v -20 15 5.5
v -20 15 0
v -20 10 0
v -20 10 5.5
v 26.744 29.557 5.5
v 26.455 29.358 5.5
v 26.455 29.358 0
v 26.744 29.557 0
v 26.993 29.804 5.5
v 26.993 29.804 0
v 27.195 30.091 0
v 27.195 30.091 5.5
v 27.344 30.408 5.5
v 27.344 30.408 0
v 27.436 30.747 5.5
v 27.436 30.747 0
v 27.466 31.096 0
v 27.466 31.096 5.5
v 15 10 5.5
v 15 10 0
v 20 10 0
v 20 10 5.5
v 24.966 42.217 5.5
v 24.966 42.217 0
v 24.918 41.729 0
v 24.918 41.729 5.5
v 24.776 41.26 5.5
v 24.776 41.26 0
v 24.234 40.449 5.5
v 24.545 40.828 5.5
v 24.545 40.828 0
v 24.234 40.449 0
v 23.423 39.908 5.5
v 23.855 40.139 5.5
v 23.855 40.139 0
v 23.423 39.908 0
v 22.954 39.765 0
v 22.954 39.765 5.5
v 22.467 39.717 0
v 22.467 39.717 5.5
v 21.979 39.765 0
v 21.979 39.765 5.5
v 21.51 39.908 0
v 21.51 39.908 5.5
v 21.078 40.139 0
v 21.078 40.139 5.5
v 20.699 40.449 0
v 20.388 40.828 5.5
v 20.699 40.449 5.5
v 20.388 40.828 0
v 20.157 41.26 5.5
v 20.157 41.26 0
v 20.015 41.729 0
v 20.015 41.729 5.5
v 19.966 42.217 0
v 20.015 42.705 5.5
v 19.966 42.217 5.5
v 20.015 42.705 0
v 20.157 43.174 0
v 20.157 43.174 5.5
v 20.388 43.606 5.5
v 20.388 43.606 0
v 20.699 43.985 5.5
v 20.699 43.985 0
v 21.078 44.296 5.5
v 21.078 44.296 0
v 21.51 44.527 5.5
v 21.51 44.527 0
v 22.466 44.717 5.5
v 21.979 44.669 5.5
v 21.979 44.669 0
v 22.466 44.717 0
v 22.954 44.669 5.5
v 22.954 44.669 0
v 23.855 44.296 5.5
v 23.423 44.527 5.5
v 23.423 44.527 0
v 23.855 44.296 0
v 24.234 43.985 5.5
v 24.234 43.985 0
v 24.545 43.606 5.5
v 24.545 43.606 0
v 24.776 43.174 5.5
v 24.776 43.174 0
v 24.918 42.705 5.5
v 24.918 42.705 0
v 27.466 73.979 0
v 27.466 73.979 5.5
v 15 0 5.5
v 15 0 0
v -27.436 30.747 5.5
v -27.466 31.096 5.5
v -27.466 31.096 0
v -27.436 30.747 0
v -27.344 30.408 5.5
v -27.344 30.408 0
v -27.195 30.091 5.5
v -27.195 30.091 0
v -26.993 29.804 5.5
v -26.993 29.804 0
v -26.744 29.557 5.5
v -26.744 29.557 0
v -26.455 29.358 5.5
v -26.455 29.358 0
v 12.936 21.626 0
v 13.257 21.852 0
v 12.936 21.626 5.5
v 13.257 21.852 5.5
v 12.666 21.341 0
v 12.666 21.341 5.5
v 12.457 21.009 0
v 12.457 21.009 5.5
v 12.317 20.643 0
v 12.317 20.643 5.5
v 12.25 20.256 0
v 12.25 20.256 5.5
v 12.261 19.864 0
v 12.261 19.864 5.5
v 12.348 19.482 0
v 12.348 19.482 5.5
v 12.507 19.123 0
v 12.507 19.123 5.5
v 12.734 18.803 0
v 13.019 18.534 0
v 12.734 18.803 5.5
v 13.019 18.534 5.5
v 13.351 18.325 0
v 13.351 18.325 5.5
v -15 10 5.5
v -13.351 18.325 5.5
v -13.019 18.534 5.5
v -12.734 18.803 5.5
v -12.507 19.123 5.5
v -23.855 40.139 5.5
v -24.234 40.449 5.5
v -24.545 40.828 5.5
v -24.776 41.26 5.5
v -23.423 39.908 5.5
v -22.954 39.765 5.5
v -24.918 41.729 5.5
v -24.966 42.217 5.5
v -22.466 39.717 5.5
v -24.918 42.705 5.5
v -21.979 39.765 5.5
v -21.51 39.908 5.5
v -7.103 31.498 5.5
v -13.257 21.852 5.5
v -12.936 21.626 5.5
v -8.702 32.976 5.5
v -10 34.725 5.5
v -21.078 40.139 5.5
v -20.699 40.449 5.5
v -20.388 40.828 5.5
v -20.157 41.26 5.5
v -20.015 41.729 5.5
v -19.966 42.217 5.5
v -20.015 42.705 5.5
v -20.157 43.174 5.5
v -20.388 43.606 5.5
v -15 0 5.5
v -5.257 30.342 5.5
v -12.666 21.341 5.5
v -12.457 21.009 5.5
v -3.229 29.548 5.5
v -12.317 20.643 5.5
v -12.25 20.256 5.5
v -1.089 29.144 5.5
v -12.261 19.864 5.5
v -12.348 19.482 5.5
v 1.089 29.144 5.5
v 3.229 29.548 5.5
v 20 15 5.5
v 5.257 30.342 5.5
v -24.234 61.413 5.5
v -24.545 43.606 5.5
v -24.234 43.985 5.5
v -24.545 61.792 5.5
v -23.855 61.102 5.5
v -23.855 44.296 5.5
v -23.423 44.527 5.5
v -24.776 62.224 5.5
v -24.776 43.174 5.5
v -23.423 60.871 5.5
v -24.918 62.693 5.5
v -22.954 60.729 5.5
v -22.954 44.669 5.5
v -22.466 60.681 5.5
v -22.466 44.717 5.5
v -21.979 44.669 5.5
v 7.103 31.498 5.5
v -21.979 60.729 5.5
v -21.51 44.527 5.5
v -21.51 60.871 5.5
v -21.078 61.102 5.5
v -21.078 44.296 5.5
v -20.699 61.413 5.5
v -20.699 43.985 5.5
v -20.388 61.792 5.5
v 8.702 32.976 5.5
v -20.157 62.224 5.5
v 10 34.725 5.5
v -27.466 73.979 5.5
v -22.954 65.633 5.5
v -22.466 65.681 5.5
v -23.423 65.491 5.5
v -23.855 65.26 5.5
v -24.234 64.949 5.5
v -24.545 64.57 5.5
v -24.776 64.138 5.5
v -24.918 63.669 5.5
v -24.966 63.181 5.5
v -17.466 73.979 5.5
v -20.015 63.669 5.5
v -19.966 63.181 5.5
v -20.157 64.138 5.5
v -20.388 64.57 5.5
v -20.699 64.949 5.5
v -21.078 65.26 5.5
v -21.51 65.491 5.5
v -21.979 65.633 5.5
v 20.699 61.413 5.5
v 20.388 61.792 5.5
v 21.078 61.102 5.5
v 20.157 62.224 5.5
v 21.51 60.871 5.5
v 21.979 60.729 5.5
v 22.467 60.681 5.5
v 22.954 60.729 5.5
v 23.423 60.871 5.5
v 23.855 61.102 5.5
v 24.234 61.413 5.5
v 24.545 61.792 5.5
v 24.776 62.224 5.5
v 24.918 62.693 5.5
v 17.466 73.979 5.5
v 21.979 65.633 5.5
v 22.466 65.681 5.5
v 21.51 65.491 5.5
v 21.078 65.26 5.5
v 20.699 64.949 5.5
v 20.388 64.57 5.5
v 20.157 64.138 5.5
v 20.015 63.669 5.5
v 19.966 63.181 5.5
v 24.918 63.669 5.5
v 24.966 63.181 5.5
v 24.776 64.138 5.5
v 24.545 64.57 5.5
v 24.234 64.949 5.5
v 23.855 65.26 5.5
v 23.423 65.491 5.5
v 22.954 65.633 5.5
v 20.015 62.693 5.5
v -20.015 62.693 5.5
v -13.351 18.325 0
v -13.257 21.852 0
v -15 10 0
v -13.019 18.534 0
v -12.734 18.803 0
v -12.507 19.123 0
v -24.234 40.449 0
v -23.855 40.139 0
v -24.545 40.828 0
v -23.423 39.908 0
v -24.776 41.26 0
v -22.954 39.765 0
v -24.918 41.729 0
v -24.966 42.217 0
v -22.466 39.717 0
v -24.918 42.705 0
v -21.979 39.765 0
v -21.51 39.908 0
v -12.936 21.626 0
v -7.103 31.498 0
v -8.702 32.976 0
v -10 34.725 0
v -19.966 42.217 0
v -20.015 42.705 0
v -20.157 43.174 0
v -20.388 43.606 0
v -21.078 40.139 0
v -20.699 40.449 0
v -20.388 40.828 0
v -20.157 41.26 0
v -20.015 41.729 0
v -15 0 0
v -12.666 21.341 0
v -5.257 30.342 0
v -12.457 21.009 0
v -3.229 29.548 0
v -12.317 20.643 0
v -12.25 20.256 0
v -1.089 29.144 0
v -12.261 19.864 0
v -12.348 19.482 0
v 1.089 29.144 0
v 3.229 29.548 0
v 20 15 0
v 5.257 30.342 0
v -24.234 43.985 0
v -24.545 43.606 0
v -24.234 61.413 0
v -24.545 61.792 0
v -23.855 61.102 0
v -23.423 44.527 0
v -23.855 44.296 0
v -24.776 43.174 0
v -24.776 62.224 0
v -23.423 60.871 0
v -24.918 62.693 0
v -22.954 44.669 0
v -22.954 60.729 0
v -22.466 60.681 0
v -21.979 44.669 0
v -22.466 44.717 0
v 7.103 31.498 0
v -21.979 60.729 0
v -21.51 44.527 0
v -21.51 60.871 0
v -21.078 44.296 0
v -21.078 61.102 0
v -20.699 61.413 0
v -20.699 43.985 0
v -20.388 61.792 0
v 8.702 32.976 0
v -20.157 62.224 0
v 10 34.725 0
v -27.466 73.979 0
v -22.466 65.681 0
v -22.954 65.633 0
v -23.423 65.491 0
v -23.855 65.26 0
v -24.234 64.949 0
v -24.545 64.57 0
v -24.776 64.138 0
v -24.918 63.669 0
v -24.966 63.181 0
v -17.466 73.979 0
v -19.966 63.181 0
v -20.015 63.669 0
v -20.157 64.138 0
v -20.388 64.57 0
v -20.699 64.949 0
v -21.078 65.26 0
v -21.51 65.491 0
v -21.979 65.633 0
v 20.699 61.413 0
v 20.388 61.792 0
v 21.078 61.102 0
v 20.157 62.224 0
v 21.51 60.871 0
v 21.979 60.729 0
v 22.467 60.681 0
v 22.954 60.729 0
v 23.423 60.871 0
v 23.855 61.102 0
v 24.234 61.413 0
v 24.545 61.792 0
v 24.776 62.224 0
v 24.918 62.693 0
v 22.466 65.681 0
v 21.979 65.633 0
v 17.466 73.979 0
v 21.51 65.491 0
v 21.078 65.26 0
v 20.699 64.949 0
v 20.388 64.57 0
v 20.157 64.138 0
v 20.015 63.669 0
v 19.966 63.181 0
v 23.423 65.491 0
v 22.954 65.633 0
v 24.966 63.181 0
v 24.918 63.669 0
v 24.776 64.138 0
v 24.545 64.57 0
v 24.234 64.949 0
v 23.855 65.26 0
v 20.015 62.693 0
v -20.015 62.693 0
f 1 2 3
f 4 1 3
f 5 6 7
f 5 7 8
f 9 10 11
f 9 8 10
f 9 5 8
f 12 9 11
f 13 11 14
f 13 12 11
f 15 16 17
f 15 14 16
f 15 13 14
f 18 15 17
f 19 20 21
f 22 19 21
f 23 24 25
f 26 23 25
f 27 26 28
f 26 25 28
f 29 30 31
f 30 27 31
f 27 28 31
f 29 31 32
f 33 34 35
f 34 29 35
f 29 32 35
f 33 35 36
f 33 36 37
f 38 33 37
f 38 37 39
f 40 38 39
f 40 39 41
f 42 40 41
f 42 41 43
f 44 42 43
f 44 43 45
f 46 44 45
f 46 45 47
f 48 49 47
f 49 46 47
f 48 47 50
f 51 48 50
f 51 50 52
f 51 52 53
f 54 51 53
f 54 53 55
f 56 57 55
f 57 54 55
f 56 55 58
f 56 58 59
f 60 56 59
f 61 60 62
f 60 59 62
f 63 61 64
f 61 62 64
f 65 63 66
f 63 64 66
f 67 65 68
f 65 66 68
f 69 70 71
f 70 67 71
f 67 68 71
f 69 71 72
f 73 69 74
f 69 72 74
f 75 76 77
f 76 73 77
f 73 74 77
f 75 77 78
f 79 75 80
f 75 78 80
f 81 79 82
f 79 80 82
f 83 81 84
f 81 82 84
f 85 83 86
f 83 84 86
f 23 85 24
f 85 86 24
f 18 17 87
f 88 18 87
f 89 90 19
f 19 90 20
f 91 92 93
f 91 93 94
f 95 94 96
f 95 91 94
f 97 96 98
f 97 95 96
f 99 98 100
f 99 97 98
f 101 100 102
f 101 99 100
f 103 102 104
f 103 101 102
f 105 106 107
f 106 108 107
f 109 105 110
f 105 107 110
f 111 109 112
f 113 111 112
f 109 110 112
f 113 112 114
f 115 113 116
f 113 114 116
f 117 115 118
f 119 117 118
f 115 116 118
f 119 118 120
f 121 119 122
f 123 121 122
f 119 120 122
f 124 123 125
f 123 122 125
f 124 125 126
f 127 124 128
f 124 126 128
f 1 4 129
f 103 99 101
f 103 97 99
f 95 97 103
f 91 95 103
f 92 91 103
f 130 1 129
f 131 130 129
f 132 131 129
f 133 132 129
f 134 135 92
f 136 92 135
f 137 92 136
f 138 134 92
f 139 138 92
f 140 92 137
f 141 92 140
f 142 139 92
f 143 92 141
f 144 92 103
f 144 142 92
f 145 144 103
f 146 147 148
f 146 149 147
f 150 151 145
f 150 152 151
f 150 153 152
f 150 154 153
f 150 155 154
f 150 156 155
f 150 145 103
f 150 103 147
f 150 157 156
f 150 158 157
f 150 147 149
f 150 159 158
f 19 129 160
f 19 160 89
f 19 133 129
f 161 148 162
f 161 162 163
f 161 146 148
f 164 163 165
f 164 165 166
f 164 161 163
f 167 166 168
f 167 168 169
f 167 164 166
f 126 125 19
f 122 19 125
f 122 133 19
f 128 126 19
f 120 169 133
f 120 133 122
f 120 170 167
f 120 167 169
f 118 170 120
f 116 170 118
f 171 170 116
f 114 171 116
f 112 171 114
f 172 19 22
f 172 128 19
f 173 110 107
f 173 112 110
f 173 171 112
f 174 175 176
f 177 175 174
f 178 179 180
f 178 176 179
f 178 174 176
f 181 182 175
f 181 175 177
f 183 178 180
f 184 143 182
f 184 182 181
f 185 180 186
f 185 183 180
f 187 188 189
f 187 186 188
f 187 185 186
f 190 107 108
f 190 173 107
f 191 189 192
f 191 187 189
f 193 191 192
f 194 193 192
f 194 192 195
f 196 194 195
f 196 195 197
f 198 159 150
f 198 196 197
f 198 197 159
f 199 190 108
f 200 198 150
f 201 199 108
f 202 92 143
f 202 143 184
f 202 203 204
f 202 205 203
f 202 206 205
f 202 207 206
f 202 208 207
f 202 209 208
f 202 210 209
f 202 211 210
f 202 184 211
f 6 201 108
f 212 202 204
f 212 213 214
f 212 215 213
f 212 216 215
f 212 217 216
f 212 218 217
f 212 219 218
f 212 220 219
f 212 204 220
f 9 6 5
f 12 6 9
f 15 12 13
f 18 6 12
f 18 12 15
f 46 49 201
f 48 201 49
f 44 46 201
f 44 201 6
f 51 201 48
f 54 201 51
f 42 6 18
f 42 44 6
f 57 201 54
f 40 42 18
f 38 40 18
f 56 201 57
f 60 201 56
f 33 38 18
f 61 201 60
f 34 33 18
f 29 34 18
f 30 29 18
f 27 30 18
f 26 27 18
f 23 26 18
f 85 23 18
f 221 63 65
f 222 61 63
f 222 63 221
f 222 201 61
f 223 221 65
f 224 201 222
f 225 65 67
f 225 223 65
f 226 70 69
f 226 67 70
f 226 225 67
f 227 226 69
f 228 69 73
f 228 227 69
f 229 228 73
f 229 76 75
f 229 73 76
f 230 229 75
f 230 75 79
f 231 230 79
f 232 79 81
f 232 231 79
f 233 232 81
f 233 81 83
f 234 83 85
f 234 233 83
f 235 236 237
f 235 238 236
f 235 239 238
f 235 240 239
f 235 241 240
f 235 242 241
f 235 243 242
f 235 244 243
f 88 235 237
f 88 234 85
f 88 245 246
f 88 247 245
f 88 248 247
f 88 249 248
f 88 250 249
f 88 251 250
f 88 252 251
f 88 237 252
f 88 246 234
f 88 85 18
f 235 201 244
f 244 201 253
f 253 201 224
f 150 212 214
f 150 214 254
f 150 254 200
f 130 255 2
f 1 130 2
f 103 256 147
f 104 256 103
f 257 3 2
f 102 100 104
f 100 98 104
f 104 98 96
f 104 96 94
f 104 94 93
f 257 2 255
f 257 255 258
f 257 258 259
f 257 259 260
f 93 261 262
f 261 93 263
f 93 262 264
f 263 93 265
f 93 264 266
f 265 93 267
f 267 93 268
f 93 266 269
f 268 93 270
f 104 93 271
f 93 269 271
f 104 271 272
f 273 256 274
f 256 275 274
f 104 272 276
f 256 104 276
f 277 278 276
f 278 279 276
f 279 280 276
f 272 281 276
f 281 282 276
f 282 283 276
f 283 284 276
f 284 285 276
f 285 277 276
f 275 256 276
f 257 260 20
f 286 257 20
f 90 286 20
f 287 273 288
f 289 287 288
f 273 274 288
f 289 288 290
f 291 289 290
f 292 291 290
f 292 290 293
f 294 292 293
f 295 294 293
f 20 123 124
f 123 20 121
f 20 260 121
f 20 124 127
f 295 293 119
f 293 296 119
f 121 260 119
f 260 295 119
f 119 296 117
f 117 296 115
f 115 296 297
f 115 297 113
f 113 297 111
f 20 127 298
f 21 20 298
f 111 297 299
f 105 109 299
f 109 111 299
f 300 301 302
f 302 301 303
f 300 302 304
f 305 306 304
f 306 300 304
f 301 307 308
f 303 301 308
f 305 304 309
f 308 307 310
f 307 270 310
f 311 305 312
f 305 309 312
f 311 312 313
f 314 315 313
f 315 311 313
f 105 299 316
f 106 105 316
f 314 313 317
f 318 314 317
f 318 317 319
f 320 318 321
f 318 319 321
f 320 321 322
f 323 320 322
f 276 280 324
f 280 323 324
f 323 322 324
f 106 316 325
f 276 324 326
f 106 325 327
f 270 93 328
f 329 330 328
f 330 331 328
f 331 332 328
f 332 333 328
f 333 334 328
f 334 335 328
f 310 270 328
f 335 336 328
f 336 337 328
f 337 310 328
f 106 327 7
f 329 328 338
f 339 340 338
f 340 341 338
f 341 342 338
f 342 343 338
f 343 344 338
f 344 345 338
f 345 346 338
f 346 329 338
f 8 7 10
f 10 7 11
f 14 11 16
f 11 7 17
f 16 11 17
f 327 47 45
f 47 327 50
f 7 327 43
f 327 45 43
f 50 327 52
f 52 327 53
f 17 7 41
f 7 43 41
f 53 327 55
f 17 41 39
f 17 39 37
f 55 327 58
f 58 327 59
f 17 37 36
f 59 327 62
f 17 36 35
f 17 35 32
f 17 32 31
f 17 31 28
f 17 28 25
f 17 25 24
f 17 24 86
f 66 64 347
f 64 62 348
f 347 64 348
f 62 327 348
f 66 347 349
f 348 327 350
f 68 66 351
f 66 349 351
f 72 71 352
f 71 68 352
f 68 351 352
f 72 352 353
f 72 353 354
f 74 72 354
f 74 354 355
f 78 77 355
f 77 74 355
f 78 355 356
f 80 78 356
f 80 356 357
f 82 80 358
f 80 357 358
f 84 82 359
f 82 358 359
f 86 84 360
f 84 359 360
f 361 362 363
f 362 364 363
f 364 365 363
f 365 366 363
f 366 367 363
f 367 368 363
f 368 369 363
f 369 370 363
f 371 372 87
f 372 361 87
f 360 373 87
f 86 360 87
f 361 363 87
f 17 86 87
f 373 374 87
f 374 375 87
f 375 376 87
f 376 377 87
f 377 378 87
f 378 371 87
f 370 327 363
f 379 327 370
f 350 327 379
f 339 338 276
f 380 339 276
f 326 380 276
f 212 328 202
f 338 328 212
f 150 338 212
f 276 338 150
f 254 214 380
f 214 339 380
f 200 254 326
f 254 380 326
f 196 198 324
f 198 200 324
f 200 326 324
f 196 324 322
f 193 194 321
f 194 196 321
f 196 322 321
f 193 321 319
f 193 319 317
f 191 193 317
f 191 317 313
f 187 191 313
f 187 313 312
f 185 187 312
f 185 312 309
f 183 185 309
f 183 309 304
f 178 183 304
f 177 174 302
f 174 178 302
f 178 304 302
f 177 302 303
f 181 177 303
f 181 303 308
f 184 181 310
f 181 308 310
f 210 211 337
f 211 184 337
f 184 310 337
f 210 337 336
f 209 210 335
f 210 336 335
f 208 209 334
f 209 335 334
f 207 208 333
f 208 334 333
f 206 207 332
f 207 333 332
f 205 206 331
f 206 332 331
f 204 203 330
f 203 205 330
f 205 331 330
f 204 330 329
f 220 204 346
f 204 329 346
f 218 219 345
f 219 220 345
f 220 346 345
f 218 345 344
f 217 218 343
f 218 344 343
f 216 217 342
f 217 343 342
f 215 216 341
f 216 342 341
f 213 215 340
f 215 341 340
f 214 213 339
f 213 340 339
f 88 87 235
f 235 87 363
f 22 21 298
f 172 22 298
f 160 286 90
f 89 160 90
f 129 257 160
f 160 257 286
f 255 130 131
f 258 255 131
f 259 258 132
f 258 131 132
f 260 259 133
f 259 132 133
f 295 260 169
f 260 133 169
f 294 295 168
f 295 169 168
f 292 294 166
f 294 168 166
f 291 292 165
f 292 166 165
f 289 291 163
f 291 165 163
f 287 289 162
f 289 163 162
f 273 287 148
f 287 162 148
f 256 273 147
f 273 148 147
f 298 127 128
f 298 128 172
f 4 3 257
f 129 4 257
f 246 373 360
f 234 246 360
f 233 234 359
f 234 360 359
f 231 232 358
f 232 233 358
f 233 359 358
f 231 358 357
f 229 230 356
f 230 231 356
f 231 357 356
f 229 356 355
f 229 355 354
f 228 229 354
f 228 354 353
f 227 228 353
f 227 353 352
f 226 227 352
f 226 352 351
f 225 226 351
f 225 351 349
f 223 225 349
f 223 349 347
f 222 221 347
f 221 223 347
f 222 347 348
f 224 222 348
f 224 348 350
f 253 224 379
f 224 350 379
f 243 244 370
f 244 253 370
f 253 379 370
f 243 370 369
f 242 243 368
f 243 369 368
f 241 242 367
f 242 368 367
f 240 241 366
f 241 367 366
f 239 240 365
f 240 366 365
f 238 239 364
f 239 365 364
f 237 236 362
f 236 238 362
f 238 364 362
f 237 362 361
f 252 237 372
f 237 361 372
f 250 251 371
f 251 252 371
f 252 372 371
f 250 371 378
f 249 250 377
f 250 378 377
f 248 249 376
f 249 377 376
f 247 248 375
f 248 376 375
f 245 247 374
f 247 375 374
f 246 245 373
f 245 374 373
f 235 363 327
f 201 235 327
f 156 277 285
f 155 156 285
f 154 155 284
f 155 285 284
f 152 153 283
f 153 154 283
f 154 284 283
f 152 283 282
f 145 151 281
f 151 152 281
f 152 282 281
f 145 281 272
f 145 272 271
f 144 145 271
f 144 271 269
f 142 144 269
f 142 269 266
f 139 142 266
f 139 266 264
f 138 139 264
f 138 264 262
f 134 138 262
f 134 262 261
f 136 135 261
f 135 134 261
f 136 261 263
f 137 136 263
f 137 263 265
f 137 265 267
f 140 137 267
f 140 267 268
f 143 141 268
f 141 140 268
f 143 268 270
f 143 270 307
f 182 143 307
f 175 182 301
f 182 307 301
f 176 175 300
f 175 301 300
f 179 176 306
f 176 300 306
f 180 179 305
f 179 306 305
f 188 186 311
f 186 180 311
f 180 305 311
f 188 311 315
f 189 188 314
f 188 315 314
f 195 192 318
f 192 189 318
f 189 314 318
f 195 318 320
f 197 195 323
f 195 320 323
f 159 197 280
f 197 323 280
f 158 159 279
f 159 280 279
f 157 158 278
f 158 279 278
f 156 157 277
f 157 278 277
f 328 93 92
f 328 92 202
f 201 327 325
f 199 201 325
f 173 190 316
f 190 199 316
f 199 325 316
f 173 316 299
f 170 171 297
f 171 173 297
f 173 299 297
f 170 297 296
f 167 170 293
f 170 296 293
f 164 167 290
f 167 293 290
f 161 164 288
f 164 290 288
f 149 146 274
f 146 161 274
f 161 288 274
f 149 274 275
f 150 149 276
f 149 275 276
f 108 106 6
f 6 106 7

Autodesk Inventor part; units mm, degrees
ref_plane "YZ Plane" through (0, 0, 0) normal (1, 0, 0) x (0, 1, 0)
ref_plane "XZ Plane" through (0, 0, 0) normal (0, 1, 0) x (-1, 0, 0)
ref_plane "XY Plane" through (0, 0, 0) normal (0, 0, 1) x (1, 0, 0)
sketch "Sketch3" plane through (0, 0, 0) normal (0, 0, 1) x (1, 0, 0)
  line L0 (-10, 20) -> (-20, 15)
  line L1 (-10, 20) -> (-27.4665, 29.933)
  line L2 (-27.4665, 29.933) -> (-27.4665, 73.9793)
  line L3 (-27.4665, 73.9793) -> (-17.4665, 73.9793)
  line L4 (-17.4665, 73.9793) -> (-10, 34.7248)
  line L5 (10, 20) -> (20, 15)
  line L6 (10, 20) -> (27.4665, 29.933)
  line L7 (27.4665, 29.933) -> (27.4665, 73.9793)
  line L8 (27.4665, 73.9793) -> (17.4665, 73.9793)
  line L9 (17.4665, 73.9793) -> (10, 34.7248)
  circle A0 centre (-22.4665, 63.181) radius 2.5
  circle A1 centre (-22.4665, 42.2172) radius 2.5
  circle A2 centre (22.4665, 63.181) radius 2.5
  circle A3 centre (22.4665, 42.2172) radius 2.5
  arc A4 (-10, 34.7248) -> (10, 34.7248) centre (0, 40.7878) ccw
  line L10 (-20, 15) -> (-20, 10)
  line L11 (-20, 10) -> (-15, 10)
  line L12 (-15, 10) -> (-15, 0)
  line L13 (-15, 0) -> (15, 0)
  line L14 (15, 0) -> (15, 10)
  line L15 (15, 10) -> (20, 10)
  line L16 (20, 10) -> (20, 15)
  point P0 (0, 0)
  dimension "d2" = 10
  dimension "d3" = 5
  dimension "d4" = 5
  dimension "d9" = 5
  dimension "d10" = 5
  dimension "d11" = 30
  dimension "d12" = 90
  dimension "d13" = 5
extrude "Extrusion1" add sketch "Sketch3" along normal blind 5.5
fillet "Fillet1" radius 2 4 edges at (27.4665, 29.933, 2.75) (-27.4665, 29.933, 2.75) (-10, 20, 2.75) (10, 20, 2.75)
properties part number "sables"
